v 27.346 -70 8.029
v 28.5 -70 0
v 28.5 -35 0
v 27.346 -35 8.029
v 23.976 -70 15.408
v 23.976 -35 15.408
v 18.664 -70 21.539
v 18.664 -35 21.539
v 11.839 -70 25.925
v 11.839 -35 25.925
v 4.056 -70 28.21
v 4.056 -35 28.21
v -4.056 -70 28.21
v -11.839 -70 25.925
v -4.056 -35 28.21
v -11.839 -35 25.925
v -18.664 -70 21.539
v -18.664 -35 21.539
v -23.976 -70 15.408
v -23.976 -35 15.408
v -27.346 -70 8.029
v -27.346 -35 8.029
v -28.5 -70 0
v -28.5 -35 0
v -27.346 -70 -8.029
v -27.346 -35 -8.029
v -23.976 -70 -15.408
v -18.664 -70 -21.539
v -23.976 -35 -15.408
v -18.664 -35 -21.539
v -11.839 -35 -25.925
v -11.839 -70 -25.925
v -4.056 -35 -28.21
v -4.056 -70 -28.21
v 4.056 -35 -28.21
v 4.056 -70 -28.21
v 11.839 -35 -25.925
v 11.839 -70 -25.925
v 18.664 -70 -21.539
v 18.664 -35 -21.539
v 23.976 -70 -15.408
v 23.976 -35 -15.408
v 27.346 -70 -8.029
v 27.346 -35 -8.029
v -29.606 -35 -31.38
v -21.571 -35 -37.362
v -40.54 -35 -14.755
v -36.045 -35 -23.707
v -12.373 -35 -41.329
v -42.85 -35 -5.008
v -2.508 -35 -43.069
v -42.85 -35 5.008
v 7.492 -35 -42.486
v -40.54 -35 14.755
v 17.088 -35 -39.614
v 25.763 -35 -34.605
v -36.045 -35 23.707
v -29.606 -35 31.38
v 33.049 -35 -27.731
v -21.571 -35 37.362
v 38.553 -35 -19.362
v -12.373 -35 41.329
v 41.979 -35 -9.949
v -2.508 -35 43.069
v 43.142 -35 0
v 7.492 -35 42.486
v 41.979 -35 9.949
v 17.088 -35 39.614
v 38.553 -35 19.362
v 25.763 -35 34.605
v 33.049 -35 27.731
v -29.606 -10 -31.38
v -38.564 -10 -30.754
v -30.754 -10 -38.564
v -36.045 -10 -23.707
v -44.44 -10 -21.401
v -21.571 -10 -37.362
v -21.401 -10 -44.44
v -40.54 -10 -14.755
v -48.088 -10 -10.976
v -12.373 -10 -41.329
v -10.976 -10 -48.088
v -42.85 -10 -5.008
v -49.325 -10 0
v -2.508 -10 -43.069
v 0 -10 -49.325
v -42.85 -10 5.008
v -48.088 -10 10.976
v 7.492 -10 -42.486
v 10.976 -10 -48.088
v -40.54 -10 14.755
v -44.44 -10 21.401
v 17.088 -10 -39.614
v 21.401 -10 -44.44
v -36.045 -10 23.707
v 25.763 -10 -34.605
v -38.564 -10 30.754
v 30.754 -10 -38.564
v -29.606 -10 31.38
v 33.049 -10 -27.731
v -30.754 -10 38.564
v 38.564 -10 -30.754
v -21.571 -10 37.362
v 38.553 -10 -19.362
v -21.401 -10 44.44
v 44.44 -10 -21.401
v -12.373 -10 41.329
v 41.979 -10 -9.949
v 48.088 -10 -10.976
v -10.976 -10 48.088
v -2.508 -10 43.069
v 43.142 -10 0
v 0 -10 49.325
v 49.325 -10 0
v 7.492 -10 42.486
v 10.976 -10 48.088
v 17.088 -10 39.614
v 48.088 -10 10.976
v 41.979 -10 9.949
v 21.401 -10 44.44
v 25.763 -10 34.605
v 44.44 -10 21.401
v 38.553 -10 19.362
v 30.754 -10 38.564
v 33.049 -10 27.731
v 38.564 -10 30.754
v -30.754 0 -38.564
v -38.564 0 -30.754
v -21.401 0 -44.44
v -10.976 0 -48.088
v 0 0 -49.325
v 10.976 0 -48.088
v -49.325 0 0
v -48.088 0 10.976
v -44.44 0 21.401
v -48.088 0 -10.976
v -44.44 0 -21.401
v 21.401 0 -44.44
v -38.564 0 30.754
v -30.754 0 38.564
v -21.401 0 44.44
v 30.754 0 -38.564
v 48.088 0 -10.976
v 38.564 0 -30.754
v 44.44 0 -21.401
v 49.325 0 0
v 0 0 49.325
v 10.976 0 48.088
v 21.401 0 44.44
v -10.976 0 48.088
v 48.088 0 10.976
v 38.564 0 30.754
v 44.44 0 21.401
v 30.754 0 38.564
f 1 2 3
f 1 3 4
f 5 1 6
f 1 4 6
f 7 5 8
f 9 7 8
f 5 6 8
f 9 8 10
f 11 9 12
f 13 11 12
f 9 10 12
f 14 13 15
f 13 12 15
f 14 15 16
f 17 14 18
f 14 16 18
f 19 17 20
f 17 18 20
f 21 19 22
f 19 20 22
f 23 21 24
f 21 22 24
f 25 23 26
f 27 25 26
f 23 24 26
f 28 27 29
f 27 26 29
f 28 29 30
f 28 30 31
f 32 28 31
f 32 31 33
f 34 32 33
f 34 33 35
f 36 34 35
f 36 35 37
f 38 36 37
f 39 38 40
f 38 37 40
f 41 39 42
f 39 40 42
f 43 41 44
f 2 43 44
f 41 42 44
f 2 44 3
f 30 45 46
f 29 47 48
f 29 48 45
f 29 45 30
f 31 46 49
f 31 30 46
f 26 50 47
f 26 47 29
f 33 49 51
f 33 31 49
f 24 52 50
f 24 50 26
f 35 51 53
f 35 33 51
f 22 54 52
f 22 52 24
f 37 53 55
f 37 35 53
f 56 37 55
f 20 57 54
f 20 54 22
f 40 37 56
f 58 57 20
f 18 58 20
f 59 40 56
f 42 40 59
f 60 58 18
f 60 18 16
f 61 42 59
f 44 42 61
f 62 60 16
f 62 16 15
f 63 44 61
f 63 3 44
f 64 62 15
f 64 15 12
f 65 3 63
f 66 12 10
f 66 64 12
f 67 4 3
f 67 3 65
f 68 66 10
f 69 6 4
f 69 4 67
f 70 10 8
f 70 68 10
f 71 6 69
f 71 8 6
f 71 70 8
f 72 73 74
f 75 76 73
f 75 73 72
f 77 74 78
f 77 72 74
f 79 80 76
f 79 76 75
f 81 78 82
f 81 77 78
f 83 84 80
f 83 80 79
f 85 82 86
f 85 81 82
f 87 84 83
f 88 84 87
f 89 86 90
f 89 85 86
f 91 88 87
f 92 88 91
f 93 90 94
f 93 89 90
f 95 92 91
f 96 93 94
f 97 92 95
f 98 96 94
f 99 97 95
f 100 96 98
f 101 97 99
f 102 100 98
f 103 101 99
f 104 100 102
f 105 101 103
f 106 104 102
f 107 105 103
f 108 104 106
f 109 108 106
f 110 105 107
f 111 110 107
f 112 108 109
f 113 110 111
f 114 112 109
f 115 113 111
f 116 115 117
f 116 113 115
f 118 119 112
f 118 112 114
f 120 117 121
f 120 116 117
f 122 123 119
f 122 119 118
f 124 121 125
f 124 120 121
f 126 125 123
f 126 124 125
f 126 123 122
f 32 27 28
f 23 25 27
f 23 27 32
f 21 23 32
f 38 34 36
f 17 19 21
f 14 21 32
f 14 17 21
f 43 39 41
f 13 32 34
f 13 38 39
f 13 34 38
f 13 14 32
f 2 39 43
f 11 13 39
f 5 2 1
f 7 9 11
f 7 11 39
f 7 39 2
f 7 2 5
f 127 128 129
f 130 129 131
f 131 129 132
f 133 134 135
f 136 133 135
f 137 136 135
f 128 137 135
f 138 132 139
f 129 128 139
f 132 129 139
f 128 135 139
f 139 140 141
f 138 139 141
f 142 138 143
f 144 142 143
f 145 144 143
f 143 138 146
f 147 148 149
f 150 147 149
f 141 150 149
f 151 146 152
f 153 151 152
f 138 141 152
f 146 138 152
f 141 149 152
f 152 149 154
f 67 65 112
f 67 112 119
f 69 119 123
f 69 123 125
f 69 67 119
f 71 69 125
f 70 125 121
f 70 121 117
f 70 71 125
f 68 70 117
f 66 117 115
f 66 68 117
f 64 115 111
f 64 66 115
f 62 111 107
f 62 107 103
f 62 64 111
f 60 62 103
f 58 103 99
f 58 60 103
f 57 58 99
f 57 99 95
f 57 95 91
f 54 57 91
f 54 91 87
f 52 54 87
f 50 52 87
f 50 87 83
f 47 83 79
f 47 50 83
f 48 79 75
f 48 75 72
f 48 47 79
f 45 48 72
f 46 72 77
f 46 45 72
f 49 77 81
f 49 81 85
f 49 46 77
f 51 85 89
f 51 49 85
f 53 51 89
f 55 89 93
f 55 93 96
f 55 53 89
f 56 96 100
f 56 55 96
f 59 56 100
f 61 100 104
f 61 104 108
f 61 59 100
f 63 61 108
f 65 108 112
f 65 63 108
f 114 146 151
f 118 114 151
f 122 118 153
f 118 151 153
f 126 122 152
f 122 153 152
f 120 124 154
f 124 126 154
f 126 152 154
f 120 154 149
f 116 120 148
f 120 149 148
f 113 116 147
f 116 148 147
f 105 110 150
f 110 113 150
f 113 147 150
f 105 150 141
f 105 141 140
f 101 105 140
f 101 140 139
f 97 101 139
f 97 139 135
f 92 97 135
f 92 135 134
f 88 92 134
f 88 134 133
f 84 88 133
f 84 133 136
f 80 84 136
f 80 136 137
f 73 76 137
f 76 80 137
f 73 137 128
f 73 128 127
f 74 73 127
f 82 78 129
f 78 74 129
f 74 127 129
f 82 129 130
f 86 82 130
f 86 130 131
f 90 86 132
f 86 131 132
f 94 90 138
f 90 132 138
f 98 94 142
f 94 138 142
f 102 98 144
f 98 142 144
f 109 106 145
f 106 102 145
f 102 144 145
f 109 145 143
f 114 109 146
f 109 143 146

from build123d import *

# Parameters (mm, degrees)
F0_R     = 49.325
F1_DEPTH = 35
F2_R     = 50.949496
F2_R_2   = 43.141888
F3_DEPTH = 25
F4_R     = 28.5
F5_DEPTH = 35


with BuildPart() as f1:
    # F0 (on Front) → F1 (new body)
    with BuildSketch(Plane.XZ):
        Circle(F0_R)
    extrude(amount=F1_DEPTH)

    # F2 (on face) → F3 (cut)
    with BuildSketch(Plane.XZ.offset(35)):
        Circle(F2_R)
        Circle(F2_R_2, mode=Mode.SUBTRACT)
    extrude(amount=-F3_DEPTH, mode=Mode.SUBTRACT)

    # F4 (on face) → F5 (join)
    with BuildSketch(Plane.XZ.offset(35)):
        Circle(F4_R)
    extrude(amount=F5_DEPTH)


solid = f1.part
